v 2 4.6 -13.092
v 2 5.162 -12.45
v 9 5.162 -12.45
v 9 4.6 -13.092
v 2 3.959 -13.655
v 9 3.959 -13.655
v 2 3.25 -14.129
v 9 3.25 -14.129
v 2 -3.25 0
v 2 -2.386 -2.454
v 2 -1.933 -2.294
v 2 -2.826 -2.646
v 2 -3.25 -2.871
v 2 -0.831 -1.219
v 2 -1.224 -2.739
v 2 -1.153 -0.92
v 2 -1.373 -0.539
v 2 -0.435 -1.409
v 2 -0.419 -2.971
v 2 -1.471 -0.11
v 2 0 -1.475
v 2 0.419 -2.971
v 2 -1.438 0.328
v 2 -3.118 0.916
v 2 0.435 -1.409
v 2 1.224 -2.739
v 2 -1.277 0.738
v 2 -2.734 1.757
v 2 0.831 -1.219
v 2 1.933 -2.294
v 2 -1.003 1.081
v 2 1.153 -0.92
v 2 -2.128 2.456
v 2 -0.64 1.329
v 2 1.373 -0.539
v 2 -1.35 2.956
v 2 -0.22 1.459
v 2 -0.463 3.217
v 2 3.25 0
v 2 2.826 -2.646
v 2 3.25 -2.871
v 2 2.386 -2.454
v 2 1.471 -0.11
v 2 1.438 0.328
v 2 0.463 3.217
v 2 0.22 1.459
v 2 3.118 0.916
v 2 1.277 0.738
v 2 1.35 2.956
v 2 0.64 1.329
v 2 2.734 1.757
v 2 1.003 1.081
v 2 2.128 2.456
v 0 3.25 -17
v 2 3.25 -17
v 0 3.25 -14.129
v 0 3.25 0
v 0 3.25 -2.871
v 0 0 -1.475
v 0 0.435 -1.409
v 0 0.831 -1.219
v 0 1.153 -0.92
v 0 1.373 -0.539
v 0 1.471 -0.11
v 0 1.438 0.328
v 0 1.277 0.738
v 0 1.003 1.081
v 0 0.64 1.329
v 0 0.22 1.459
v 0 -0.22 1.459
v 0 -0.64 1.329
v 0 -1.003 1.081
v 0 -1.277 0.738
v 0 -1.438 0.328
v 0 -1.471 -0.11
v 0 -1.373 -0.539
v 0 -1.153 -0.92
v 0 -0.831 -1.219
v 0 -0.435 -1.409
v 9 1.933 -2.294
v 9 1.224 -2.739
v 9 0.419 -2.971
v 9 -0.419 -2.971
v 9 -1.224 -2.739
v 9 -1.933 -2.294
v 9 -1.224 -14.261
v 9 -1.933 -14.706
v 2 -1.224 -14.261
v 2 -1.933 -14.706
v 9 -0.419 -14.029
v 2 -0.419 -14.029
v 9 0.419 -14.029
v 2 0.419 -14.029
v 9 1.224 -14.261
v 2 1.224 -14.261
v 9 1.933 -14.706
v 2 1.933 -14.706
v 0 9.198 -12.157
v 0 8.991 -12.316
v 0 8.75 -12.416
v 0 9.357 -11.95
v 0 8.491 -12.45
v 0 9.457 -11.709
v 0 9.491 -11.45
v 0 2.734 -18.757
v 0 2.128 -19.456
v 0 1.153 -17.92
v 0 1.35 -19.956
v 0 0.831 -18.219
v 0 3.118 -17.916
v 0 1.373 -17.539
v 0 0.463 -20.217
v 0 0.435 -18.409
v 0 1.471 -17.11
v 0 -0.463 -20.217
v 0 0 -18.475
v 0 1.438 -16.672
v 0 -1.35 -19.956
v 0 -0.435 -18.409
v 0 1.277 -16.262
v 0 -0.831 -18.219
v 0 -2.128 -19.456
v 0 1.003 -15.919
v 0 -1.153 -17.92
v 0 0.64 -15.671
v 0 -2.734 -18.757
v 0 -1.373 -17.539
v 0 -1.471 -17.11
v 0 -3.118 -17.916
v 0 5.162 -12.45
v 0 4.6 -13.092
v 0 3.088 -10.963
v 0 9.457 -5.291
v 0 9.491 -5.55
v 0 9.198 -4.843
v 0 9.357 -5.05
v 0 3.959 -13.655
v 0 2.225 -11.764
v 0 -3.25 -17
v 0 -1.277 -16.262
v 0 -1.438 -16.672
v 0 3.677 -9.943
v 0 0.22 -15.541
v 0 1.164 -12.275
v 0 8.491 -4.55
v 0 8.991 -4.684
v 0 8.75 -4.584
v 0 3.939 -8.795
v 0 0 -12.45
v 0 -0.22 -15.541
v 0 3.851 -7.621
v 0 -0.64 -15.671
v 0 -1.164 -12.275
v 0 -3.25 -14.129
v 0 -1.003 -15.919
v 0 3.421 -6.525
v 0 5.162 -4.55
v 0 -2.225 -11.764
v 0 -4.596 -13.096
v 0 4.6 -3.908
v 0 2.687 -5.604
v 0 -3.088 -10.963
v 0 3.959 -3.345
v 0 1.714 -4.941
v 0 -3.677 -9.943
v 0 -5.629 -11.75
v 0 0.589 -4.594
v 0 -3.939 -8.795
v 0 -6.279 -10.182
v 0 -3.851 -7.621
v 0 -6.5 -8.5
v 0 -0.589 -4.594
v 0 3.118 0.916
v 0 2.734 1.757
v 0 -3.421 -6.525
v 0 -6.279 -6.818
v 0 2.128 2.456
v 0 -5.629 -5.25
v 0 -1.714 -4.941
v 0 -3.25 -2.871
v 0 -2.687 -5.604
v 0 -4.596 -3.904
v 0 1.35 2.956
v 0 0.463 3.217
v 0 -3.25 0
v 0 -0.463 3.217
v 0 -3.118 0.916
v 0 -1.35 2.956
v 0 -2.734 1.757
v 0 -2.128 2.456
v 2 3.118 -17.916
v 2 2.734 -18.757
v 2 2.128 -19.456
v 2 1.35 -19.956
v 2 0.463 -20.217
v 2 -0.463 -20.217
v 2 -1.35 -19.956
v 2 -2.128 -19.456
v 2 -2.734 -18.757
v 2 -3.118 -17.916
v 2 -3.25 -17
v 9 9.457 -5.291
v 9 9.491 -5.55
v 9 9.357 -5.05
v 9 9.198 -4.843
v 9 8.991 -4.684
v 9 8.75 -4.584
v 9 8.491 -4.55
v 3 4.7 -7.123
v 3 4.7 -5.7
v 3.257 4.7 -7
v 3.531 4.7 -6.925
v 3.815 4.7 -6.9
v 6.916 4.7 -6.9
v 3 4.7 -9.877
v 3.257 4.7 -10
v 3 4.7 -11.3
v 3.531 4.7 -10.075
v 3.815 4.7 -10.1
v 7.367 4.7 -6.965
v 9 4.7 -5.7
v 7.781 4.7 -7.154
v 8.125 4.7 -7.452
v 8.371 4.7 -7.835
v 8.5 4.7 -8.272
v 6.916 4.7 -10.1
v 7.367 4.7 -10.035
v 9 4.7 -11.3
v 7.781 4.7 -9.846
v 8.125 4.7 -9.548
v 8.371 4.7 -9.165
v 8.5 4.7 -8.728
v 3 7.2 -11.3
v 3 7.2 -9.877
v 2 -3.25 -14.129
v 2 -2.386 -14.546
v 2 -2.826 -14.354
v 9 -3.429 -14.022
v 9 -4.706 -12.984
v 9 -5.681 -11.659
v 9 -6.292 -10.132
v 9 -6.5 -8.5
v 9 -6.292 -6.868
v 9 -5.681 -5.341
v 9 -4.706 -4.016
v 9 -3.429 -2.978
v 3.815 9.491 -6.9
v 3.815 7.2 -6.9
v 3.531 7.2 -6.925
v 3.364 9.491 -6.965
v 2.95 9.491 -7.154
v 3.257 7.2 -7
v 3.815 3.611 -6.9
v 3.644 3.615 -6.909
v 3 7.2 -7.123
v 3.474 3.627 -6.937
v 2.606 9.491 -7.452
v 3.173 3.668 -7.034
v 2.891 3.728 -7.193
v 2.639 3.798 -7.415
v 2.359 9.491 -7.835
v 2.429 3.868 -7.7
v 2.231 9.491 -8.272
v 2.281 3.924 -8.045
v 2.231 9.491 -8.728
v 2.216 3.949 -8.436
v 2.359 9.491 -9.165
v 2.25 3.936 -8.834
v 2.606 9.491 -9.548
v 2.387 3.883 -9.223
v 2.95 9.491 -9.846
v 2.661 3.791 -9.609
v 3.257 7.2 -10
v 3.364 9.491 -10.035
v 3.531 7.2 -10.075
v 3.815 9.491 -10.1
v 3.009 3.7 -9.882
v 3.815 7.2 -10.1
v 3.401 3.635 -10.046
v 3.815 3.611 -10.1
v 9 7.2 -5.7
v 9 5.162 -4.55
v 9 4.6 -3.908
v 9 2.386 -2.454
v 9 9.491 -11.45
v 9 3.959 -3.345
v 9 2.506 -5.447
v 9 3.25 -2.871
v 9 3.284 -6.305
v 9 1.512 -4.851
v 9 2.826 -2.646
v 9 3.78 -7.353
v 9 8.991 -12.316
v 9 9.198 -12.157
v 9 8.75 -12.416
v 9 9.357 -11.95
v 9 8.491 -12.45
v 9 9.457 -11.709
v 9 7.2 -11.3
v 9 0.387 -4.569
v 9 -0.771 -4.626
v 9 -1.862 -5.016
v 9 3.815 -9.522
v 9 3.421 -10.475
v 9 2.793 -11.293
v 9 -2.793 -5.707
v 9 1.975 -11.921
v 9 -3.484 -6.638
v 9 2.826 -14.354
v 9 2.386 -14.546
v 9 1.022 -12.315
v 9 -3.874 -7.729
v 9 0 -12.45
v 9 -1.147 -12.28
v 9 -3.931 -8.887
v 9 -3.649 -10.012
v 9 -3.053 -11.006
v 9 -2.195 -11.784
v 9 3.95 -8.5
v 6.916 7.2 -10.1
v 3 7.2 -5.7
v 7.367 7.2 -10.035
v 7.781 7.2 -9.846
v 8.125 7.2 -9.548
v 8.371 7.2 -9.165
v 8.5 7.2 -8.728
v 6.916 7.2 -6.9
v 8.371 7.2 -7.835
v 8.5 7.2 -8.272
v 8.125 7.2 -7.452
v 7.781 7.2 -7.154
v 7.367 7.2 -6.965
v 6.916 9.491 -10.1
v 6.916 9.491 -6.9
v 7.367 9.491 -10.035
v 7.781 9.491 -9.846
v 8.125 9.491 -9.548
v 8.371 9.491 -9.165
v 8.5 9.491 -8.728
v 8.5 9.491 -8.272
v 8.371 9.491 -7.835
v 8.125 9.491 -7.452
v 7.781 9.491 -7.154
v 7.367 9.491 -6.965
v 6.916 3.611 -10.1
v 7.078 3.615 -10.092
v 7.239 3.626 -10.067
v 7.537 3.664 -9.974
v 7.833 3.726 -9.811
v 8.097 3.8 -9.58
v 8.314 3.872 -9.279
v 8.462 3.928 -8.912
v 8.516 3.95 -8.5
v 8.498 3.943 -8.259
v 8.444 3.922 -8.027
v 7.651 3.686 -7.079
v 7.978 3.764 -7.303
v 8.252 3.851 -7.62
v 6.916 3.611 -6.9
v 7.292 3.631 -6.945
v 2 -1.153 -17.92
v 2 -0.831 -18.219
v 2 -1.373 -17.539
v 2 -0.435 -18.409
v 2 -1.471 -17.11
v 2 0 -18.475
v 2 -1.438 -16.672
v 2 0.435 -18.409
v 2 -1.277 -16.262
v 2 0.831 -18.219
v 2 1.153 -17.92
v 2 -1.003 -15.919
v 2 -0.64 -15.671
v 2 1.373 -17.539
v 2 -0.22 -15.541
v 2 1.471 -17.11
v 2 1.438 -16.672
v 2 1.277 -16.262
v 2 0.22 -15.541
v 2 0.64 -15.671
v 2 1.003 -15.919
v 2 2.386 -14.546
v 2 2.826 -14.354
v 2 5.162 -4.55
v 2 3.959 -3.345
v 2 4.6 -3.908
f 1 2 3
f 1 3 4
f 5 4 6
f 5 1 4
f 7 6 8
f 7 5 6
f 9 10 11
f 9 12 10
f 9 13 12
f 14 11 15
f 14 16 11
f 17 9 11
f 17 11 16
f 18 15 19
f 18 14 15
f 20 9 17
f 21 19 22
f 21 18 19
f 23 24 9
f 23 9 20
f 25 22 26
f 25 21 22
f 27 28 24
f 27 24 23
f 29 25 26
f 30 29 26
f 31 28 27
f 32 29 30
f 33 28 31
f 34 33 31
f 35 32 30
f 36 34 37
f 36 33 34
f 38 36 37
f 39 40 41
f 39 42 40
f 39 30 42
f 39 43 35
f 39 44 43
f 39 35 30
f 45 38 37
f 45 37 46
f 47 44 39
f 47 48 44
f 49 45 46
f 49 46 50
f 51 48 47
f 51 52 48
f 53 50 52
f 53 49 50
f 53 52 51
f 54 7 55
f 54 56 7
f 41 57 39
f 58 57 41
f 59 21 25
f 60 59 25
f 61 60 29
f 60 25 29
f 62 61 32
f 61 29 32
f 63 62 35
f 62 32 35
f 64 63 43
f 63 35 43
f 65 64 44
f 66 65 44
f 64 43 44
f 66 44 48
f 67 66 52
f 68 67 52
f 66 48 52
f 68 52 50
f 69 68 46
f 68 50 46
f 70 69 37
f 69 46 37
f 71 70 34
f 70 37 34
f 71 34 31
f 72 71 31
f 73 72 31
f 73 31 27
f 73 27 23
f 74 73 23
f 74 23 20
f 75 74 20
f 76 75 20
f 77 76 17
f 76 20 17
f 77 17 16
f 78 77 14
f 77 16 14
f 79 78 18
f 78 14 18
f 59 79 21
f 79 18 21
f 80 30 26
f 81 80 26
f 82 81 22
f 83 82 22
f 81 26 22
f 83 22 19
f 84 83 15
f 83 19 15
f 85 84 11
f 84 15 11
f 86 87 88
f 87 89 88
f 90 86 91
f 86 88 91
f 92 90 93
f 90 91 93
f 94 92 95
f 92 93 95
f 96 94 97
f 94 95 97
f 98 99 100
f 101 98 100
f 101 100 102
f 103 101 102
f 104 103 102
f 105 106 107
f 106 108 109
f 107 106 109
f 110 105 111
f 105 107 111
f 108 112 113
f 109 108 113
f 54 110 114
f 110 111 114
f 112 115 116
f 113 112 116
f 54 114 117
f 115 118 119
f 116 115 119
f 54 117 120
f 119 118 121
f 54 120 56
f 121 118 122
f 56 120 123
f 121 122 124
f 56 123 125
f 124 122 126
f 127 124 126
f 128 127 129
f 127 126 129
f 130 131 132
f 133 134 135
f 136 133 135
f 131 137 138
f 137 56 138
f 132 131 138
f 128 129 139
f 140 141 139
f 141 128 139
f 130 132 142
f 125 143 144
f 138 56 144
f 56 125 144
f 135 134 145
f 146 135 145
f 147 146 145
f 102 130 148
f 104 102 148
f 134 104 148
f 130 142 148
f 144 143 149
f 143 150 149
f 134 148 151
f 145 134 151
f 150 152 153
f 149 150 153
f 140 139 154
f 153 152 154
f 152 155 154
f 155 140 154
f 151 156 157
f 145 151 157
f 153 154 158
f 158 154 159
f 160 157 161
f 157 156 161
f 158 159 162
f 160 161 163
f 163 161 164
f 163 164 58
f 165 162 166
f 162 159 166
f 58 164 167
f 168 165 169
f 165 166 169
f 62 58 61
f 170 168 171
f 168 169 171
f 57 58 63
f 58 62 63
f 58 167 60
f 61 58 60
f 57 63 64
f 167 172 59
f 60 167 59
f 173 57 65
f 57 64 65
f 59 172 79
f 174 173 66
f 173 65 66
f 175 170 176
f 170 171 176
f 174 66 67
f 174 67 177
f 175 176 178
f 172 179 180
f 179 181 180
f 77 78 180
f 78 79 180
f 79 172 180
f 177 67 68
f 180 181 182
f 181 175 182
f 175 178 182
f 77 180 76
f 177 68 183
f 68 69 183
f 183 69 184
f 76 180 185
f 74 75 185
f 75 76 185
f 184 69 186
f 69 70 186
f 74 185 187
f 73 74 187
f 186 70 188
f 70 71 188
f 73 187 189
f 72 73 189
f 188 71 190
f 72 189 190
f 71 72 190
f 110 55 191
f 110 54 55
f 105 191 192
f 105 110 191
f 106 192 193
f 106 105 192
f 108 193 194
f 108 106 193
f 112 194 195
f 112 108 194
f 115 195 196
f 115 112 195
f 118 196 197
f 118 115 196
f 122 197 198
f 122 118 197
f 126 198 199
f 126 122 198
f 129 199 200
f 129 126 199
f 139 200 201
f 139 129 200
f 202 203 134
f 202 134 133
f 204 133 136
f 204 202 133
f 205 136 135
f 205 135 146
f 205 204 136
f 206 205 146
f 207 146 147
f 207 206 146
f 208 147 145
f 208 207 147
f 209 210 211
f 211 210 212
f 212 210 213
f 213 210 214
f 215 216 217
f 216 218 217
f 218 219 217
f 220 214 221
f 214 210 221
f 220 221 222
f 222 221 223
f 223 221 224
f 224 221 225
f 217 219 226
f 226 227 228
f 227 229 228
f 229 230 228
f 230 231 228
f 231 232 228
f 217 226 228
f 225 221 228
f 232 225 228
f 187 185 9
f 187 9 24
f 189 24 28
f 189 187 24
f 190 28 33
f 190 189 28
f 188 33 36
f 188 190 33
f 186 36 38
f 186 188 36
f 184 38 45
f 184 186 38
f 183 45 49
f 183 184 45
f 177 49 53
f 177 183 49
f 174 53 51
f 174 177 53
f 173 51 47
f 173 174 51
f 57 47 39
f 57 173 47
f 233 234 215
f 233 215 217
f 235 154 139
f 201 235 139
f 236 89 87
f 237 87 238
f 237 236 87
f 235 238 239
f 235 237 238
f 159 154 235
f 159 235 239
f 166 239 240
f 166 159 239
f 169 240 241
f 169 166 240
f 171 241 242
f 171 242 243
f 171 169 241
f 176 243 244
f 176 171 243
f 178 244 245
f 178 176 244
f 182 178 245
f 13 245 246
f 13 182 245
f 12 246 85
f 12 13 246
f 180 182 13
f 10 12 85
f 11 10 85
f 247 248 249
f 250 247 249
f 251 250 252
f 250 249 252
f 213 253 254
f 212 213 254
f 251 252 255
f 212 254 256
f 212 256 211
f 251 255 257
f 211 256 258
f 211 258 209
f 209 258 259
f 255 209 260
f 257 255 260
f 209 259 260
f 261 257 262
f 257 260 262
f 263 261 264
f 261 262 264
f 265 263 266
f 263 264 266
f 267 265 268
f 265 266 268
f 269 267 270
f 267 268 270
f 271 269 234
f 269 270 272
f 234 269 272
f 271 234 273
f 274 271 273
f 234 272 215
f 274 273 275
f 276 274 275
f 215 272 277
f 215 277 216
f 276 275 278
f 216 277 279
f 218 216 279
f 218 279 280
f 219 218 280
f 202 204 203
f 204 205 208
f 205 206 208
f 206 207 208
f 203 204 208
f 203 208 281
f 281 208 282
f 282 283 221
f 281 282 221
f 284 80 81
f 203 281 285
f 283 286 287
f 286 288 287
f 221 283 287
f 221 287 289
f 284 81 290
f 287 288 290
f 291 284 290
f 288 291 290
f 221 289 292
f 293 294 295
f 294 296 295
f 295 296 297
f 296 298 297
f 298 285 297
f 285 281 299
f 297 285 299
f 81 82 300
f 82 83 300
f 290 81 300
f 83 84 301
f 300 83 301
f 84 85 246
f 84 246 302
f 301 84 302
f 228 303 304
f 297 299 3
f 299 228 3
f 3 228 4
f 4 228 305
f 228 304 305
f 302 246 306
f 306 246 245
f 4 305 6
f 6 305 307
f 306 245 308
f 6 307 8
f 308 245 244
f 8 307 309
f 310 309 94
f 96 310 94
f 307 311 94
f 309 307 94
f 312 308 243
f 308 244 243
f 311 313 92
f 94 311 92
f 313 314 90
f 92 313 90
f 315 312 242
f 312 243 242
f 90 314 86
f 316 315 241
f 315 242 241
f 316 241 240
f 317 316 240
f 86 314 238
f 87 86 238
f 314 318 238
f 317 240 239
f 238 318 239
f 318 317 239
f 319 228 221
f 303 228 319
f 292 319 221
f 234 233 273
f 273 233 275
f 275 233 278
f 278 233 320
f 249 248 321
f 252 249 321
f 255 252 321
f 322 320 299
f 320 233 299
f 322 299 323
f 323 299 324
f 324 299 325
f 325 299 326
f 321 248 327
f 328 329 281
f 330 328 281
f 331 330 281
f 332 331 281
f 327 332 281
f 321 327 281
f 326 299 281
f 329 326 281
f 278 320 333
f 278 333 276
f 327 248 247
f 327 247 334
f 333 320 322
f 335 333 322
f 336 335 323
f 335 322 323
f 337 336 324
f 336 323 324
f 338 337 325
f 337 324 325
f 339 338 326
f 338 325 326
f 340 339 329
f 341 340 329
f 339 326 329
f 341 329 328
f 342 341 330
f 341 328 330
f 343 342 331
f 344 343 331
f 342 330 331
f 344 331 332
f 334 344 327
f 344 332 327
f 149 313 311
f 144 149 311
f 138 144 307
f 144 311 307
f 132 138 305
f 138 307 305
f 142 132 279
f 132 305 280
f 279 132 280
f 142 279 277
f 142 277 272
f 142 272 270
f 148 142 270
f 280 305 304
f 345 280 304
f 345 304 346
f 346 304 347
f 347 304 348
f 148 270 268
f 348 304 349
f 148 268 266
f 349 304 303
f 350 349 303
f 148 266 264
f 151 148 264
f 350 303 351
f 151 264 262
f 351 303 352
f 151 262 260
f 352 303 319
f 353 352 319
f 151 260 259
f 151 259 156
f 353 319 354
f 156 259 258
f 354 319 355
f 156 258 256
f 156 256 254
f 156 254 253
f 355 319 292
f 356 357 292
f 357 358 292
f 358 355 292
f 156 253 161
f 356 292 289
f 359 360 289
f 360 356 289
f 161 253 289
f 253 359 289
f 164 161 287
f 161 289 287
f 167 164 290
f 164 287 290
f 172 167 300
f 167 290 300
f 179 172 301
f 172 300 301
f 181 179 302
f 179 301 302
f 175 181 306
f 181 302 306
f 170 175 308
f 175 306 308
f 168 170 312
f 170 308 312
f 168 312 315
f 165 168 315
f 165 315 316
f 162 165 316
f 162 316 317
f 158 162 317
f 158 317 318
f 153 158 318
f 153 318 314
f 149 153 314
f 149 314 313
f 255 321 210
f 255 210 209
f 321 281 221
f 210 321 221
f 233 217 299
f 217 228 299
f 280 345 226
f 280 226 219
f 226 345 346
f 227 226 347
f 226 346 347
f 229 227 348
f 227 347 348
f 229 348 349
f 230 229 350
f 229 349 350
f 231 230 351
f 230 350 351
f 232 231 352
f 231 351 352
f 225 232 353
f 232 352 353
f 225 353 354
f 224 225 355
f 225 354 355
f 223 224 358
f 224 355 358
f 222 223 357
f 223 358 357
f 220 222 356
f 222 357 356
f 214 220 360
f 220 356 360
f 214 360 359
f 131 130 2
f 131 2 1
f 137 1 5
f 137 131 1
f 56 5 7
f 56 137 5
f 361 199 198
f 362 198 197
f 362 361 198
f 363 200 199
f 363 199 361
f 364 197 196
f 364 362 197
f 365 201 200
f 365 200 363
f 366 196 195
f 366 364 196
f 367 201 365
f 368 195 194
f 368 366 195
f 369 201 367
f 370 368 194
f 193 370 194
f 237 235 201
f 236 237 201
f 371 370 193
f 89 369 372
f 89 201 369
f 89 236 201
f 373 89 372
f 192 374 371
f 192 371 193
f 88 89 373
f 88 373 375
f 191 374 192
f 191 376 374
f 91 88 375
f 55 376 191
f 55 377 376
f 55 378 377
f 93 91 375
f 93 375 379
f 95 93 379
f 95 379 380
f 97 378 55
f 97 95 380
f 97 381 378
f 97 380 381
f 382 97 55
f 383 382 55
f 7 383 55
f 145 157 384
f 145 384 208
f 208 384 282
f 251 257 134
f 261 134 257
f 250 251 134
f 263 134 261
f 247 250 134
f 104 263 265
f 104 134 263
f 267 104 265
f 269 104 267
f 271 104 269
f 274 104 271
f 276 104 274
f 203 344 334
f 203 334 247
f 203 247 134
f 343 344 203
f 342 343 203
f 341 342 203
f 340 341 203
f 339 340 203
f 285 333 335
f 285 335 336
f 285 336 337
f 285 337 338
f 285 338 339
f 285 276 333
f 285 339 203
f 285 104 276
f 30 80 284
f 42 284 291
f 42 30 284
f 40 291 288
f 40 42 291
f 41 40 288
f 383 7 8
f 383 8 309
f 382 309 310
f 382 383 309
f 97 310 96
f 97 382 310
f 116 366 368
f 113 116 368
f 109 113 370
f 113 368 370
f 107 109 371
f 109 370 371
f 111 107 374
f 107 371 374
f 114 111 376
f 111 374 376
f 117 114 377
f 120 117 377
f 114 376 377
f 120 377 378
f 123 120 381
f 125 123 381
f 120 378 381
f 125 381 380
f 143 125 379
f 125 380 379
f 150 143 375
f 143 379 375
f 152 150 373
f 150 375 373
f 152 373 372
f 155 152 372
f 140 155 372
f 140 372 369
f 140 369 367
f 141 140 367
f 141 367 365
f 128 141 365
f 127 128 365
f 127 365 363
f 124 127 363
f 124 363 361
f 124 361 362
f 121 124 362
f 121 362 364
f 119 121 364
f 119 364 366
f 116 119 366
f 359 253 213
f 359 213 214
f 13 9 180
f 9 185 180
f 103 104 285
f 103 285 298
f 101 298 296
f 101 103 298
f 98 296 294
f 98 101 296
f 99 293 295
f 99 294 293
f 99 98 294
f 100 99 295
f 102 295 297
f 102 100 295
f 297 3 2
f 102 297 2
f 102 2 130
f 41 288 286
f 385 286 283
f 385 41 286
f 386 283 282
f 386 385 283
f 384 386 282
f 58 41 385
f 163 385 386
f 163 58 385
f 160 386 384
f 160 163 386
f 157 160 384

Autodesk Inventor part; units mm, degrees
ref_plane "YZ Plane" through (0, 0, 0) normal (1, 0, 0) x (0, 1, 0)
ref_plane "XZ Plane" through (0, 0, 0) normal (0, 1, 0) x (-1, 0, 0)
ref_plane "XY Plane" through (0, 0, 0) normal (0, 0, 1) x (1, 0, 0)
sketch "Sketch1" plane through (0, 0, 0) normal (1, 0, 0) x (0, 1, 0)
  line L0 (0, 0) -> (0, -17)
  circle A0 centre (0, 0) radius 1.6
  circle A1 centre (0, -17) radius 1.6
  circle A2 centre (0, 0) radius 3.25
  circle A3 centre (0, -17) radius 3.25
  circle A4 centre (0, -8.5) radius 6.5
  line L1 (3.25, 0) -> (3.25, -17)
  line L2 (-3.25, 0) -> (-3.25, -17)
  point P0 (3.25, -14.1292)
  point P1 (3.25, -2.8708)
  point P2 (-3.25, -2.8708)
  point P3 (-3.25, -14.1292)
  dimension "d3" = 6.5
  dimension "d4" = 6.5
  dimension "d0" = 17
  dimension "d1" = 3.2
  dimension "d2" = 3.2
  dimension "d5" = 13
extrude "Extrusion1" add sketch "Sketch1" along normal blind 2
sketch "Sketch2" plane through (2, 0, 0) normal (1, 0, 0) x (0, 0, -1)
  arc A0 (14.1292, 3.25) -> (2.8708, 3.25) centre (8.5, 0) ccw projected
  circle A1 centre (8.5, 0) radius 6.5
  circle A2 centre (8.5, 0) radius 3.95
  point P0 (0, 0)
  point P1 (2.8708, 3.25)
  point P2 (14.1292, 3.25)
  dimension "d8" = 7.9
extrude "Extrusion2" add sketch "Sketch2" along normal blind 7
sketch "Sketch3" plane through (2, 0, 0) normal (1, 0, 0) x (0, 0, -1)
  circle A0 centre (0, 0) radius 3
  circle A1 centre (17, 0) radius 1.6 projected
  circle A2 centre (17, 0) radius 3
  dimension "d11" = 6
  dimension "d12" = 6
extrude "Extrusion3" cut sketch "Sketch3" along normal through all contours A0 | A1 | A2
sketch "Sketch4" plane through (0, 0, 0) normal (-1, 0, 0) x (0, 0, 1)
  circle A0 centre (-8.5, 0) radius 3.95 projected
  line L0 (-8.5, 0) -> (-8.5, 3.95)
  line L1 (-5.7, 6.45) -> (-11.3, 6.45)
  line L2 (-11.3, 6.45) -> (-11.3, 1.45)
  line L3 (-11.3, 1.45) -> (-5.7, 1.45)
  line L4 (-5.7, 1.45) -> (-5.7, 6.45)
  line L5 (-5.7, 6.45) -> (-11.3, 1.45) construction
  line L6 (-11.3, 6.45) -> (-5.7, 1.45) construction
  line L7 (-11.3, 3.95) -> (-5.7, 3.95)
  line L8 (-12.45, -7.9907) -> (-4.55, -7.9907)
  line L9 (-4.55, -7.9907) -> (-4.55, 7.9907)
  line L10 (-4.55, 7.9907) -> (-12.45, 7.9907)
  line L11 (-12.45, 7.9907) -> (-12.45, -7.9907)
  line L12 (-12.45, -7.9907) -> (-4.55, 7.9907) construction
  line L13 (-4.55, -7.9907) -> (-12.45, 7.9907) construction
  arc A1 (-2.2941, 1.9331) -> (-14.7059, 1.9331) centre (-8.5, 0) ccw projected
  line L14 (-4.55, 5.1621) -> (-12.45, 5.1621)
  point P0 (0, 0)
  point P1 (-5.7, 5.1621)
  point P2 (-5.7, 2.7861)
  point P3 (-4.55, 0)
  dimension "d15" = 5.6
  dimension "d16" = 5
extrude "Extrusion4" add sketch "Sketch4" against normal blind 9 contours A0 L4 L14 L9 | A1 L4 L1 L2 L11 L10 L9 | L14 L4 A1 | A1 L2 L14 | A1 L1 L4 | L4 L14 L2 A1 L1 | L2 L1 A1 | L1 A1
sketch "Sketch5" plane through (9, 0, 0) normal (1, 0, 0) x (0, 0, -1)
  circle A0 centre (8.5, 0) radius 3.95 projected
  line L0 (8.5, 0) -> (8.5, 3.95)
  line L1 (5.7, 1.45) -> (11.3, 1.45)
  line L2 (11.3, 1.45) -> (11.3, 6.45)
  line L3 (11.3, 6.45) -> (5.7, 6.45)
  line L4 (5.7, 6.45) -> (5.7, 1.45)
  line L5 (5.7, 1.45) -> (11.3, 6.45) construction
  line L6 (11.3, 1.45) -> (5.7, 6.45) construction
  line L7 (8.5, 3.95) -> (5.7, 3.95)
  line L8 (5.7, 3.95) -> (11.3, 3.95)
  point P0 (0, 0)
  dimension "d19" = 5.6
  dimension "d20" = 5
extrude "Extrusion5" cut sketch "Sketch5" against normal blind 6 contours L7 L4 L3 L2 L8
sketch "Sketch6" plane through (0, 7.9907, -4.55) normal (0, 1, 0) x (1, 0, 0)
  point P0 (0, -4.55)
sketch "Sketch7" plane through (0, 7.9907, -4.55) normal (0, 1, 0) x (1, 0, 0)
  line L0 (9, 3.95) -> (3, 3.95) projected
  line L1 (3.8147, 3.95) -> (6.916, 3.95) construction
  line L2 (3.8147, 2.35) -> (6.916, 2.35)
  line L3 (6.916, 5.55) -> (3.8147, 5.55)
  arc A0 (3.8147, 5.55) -> (3.8147, 2.35) centre (3.8147, 3.95) ccw
  arc A1 (6.916, 2.35) -> (6.916, 5.55) centre (6.916, 3.95) ccw
  point P0 (0, -4.55)
  point P1 (5.3654, 3.95)
  dimension "d23" = 3.2
sketch "Sketch8" plane through (9, 3.95, -8.5) normal (0, 1, 0) x (1, 0, 0)
  line L0 (0, 0) -> (0, -2.8) projected
  line L1 (-7, -3.95) -> (-7, 3.95) projected
  line L2 (0, -2.8) -> (-7, -2.8)
  line L3 (-7, -2.8) -> (-7, 2.7358)
  line L4 (0, -2.8) -> (-7, -2.8)
  line L5 (-7, -2.8) -> (-7, 2.8)
  line L6 (-7, 2.8) -> (0, 2.8)
  line L7 (0, 2.8) -> (0, -2.8)
  point P0 (-9, -8.5)
  dimension "d28" = 5.6
sketch "Sketch9" plane through (9, 0, 0) normal (1, 0, 0) x (0, 0, -1)
  line L0 (5.7, 3.95) -> (5.7, 6.45) projected
  line L1 (5.7, 6.45) -> (11.3, 6.45)
  line L2 (11.3, 6.45) -> (11.3, 7.2)
  line L3 (11.3, 7.2) -> (5.7, 7.2)
  line L4 (5.7, 7.2) -> (5.7, 6.45)
  point P0 (0, 0)
  dimension "d29" = 0.75
extrude "Extrusion8" cut sketch "Sketch9" against normal blind 6
sketch "Sketch10" plane through (9, 0, 0) normal (1, 0, 0) x (0, 0, -1)
  line L0 (11.3, 7.2) -> (11.3, 3.95) projected
  line L1 (5.7, 3.95) -> (5.7, 7.2) projected
  line L2 (11.3, 3.95) -> (5.7, 3.95)
  line L3 (5.7, 3.95) -> (5.7, 4.7)
  line L4 (5.7, 4.7) -> (11.3, 4.7)
  line L5 (11.3, 4.7) -> (11.3, 3.95)
  point P0 (0, 0)
  dimension "d32" = 0.75
extrude "Extrusion9" add sketch "Sketch10" against normal blind 6
sketch "Sketch11" plane through (0, 7.9907, -4.55) normal (0, 1, 0) x (1, 0, 0)
  line L0 (0, -1.6792) -> (0, 0) projected
  line L1 (9, 7.9) -> (9, 10.1559) projected
  line L2 (0, 0) -> (9, 0)
  line L3 (9, 0) -> (9, 7.9)
  line L4 (9, 7.9) -> (0, 7.9)
  line L5 (0, 7.9) -> (0, 0)
  point P0 (0, -4.55)
extrude "Extrusion11" add sketch "Sketch11" along normal blind 1.5
extrude "Extrusion12" cut sketch "Sketch7" along normal mid plane 10
fillet "Fillet1" radius 1 2 edges at (4.5, 9.4907, -4.55) (4.5, 9.4907, -12.45)
sketch "Sketch12" plane through (2, 0, 0) normal (1, 0, 0) x (0, 0, -1)
  circle A0 centre (0, 0) radius 1.6 projected
  circle A1 centre (0, 0) radius 2.1992
  circle A2 centre (17, 0) radius 1.6 projected
  circle A3 centre (17, 0) radius 2.2664
extrude "Extrusion13" add sketch "Sketch12" against normal blind 2 contours A0 | A1 | A2 | A3
sketch "Sketch13" plane through (2, 0, 0) normal (1, 0, 0) x (0, 0, -1)
  circle A0 centre (0, 0) radius 1.475
  arc A1 (17, -3.25) -> (17, 3.25) centre (17, 0) ccw projected
  circle A2 centre (17, 0) radius 1.475
  dimension "d44" = 2.95
  dimension "d45" = 2.95
extrude "Extrusion14" cut sketch "Sketch13" against normal blind 2
sketch "Sketch14" plane through (2, 0, -8.5) normal (1, 0, 0) x (0, 0, -1)
  circle A0 centre (0, 0) radius 3.95
  point P0 (-8.5, 0)
extrude "Extrusion15" cut sketch "Sketch14" against normal blind 10
sketch "Sketch15" plane through (2, 0, 0) normal (1, 0, 0) x (0, 0, -1)
  point P0 (0, 0)
properties part number "acople2"
